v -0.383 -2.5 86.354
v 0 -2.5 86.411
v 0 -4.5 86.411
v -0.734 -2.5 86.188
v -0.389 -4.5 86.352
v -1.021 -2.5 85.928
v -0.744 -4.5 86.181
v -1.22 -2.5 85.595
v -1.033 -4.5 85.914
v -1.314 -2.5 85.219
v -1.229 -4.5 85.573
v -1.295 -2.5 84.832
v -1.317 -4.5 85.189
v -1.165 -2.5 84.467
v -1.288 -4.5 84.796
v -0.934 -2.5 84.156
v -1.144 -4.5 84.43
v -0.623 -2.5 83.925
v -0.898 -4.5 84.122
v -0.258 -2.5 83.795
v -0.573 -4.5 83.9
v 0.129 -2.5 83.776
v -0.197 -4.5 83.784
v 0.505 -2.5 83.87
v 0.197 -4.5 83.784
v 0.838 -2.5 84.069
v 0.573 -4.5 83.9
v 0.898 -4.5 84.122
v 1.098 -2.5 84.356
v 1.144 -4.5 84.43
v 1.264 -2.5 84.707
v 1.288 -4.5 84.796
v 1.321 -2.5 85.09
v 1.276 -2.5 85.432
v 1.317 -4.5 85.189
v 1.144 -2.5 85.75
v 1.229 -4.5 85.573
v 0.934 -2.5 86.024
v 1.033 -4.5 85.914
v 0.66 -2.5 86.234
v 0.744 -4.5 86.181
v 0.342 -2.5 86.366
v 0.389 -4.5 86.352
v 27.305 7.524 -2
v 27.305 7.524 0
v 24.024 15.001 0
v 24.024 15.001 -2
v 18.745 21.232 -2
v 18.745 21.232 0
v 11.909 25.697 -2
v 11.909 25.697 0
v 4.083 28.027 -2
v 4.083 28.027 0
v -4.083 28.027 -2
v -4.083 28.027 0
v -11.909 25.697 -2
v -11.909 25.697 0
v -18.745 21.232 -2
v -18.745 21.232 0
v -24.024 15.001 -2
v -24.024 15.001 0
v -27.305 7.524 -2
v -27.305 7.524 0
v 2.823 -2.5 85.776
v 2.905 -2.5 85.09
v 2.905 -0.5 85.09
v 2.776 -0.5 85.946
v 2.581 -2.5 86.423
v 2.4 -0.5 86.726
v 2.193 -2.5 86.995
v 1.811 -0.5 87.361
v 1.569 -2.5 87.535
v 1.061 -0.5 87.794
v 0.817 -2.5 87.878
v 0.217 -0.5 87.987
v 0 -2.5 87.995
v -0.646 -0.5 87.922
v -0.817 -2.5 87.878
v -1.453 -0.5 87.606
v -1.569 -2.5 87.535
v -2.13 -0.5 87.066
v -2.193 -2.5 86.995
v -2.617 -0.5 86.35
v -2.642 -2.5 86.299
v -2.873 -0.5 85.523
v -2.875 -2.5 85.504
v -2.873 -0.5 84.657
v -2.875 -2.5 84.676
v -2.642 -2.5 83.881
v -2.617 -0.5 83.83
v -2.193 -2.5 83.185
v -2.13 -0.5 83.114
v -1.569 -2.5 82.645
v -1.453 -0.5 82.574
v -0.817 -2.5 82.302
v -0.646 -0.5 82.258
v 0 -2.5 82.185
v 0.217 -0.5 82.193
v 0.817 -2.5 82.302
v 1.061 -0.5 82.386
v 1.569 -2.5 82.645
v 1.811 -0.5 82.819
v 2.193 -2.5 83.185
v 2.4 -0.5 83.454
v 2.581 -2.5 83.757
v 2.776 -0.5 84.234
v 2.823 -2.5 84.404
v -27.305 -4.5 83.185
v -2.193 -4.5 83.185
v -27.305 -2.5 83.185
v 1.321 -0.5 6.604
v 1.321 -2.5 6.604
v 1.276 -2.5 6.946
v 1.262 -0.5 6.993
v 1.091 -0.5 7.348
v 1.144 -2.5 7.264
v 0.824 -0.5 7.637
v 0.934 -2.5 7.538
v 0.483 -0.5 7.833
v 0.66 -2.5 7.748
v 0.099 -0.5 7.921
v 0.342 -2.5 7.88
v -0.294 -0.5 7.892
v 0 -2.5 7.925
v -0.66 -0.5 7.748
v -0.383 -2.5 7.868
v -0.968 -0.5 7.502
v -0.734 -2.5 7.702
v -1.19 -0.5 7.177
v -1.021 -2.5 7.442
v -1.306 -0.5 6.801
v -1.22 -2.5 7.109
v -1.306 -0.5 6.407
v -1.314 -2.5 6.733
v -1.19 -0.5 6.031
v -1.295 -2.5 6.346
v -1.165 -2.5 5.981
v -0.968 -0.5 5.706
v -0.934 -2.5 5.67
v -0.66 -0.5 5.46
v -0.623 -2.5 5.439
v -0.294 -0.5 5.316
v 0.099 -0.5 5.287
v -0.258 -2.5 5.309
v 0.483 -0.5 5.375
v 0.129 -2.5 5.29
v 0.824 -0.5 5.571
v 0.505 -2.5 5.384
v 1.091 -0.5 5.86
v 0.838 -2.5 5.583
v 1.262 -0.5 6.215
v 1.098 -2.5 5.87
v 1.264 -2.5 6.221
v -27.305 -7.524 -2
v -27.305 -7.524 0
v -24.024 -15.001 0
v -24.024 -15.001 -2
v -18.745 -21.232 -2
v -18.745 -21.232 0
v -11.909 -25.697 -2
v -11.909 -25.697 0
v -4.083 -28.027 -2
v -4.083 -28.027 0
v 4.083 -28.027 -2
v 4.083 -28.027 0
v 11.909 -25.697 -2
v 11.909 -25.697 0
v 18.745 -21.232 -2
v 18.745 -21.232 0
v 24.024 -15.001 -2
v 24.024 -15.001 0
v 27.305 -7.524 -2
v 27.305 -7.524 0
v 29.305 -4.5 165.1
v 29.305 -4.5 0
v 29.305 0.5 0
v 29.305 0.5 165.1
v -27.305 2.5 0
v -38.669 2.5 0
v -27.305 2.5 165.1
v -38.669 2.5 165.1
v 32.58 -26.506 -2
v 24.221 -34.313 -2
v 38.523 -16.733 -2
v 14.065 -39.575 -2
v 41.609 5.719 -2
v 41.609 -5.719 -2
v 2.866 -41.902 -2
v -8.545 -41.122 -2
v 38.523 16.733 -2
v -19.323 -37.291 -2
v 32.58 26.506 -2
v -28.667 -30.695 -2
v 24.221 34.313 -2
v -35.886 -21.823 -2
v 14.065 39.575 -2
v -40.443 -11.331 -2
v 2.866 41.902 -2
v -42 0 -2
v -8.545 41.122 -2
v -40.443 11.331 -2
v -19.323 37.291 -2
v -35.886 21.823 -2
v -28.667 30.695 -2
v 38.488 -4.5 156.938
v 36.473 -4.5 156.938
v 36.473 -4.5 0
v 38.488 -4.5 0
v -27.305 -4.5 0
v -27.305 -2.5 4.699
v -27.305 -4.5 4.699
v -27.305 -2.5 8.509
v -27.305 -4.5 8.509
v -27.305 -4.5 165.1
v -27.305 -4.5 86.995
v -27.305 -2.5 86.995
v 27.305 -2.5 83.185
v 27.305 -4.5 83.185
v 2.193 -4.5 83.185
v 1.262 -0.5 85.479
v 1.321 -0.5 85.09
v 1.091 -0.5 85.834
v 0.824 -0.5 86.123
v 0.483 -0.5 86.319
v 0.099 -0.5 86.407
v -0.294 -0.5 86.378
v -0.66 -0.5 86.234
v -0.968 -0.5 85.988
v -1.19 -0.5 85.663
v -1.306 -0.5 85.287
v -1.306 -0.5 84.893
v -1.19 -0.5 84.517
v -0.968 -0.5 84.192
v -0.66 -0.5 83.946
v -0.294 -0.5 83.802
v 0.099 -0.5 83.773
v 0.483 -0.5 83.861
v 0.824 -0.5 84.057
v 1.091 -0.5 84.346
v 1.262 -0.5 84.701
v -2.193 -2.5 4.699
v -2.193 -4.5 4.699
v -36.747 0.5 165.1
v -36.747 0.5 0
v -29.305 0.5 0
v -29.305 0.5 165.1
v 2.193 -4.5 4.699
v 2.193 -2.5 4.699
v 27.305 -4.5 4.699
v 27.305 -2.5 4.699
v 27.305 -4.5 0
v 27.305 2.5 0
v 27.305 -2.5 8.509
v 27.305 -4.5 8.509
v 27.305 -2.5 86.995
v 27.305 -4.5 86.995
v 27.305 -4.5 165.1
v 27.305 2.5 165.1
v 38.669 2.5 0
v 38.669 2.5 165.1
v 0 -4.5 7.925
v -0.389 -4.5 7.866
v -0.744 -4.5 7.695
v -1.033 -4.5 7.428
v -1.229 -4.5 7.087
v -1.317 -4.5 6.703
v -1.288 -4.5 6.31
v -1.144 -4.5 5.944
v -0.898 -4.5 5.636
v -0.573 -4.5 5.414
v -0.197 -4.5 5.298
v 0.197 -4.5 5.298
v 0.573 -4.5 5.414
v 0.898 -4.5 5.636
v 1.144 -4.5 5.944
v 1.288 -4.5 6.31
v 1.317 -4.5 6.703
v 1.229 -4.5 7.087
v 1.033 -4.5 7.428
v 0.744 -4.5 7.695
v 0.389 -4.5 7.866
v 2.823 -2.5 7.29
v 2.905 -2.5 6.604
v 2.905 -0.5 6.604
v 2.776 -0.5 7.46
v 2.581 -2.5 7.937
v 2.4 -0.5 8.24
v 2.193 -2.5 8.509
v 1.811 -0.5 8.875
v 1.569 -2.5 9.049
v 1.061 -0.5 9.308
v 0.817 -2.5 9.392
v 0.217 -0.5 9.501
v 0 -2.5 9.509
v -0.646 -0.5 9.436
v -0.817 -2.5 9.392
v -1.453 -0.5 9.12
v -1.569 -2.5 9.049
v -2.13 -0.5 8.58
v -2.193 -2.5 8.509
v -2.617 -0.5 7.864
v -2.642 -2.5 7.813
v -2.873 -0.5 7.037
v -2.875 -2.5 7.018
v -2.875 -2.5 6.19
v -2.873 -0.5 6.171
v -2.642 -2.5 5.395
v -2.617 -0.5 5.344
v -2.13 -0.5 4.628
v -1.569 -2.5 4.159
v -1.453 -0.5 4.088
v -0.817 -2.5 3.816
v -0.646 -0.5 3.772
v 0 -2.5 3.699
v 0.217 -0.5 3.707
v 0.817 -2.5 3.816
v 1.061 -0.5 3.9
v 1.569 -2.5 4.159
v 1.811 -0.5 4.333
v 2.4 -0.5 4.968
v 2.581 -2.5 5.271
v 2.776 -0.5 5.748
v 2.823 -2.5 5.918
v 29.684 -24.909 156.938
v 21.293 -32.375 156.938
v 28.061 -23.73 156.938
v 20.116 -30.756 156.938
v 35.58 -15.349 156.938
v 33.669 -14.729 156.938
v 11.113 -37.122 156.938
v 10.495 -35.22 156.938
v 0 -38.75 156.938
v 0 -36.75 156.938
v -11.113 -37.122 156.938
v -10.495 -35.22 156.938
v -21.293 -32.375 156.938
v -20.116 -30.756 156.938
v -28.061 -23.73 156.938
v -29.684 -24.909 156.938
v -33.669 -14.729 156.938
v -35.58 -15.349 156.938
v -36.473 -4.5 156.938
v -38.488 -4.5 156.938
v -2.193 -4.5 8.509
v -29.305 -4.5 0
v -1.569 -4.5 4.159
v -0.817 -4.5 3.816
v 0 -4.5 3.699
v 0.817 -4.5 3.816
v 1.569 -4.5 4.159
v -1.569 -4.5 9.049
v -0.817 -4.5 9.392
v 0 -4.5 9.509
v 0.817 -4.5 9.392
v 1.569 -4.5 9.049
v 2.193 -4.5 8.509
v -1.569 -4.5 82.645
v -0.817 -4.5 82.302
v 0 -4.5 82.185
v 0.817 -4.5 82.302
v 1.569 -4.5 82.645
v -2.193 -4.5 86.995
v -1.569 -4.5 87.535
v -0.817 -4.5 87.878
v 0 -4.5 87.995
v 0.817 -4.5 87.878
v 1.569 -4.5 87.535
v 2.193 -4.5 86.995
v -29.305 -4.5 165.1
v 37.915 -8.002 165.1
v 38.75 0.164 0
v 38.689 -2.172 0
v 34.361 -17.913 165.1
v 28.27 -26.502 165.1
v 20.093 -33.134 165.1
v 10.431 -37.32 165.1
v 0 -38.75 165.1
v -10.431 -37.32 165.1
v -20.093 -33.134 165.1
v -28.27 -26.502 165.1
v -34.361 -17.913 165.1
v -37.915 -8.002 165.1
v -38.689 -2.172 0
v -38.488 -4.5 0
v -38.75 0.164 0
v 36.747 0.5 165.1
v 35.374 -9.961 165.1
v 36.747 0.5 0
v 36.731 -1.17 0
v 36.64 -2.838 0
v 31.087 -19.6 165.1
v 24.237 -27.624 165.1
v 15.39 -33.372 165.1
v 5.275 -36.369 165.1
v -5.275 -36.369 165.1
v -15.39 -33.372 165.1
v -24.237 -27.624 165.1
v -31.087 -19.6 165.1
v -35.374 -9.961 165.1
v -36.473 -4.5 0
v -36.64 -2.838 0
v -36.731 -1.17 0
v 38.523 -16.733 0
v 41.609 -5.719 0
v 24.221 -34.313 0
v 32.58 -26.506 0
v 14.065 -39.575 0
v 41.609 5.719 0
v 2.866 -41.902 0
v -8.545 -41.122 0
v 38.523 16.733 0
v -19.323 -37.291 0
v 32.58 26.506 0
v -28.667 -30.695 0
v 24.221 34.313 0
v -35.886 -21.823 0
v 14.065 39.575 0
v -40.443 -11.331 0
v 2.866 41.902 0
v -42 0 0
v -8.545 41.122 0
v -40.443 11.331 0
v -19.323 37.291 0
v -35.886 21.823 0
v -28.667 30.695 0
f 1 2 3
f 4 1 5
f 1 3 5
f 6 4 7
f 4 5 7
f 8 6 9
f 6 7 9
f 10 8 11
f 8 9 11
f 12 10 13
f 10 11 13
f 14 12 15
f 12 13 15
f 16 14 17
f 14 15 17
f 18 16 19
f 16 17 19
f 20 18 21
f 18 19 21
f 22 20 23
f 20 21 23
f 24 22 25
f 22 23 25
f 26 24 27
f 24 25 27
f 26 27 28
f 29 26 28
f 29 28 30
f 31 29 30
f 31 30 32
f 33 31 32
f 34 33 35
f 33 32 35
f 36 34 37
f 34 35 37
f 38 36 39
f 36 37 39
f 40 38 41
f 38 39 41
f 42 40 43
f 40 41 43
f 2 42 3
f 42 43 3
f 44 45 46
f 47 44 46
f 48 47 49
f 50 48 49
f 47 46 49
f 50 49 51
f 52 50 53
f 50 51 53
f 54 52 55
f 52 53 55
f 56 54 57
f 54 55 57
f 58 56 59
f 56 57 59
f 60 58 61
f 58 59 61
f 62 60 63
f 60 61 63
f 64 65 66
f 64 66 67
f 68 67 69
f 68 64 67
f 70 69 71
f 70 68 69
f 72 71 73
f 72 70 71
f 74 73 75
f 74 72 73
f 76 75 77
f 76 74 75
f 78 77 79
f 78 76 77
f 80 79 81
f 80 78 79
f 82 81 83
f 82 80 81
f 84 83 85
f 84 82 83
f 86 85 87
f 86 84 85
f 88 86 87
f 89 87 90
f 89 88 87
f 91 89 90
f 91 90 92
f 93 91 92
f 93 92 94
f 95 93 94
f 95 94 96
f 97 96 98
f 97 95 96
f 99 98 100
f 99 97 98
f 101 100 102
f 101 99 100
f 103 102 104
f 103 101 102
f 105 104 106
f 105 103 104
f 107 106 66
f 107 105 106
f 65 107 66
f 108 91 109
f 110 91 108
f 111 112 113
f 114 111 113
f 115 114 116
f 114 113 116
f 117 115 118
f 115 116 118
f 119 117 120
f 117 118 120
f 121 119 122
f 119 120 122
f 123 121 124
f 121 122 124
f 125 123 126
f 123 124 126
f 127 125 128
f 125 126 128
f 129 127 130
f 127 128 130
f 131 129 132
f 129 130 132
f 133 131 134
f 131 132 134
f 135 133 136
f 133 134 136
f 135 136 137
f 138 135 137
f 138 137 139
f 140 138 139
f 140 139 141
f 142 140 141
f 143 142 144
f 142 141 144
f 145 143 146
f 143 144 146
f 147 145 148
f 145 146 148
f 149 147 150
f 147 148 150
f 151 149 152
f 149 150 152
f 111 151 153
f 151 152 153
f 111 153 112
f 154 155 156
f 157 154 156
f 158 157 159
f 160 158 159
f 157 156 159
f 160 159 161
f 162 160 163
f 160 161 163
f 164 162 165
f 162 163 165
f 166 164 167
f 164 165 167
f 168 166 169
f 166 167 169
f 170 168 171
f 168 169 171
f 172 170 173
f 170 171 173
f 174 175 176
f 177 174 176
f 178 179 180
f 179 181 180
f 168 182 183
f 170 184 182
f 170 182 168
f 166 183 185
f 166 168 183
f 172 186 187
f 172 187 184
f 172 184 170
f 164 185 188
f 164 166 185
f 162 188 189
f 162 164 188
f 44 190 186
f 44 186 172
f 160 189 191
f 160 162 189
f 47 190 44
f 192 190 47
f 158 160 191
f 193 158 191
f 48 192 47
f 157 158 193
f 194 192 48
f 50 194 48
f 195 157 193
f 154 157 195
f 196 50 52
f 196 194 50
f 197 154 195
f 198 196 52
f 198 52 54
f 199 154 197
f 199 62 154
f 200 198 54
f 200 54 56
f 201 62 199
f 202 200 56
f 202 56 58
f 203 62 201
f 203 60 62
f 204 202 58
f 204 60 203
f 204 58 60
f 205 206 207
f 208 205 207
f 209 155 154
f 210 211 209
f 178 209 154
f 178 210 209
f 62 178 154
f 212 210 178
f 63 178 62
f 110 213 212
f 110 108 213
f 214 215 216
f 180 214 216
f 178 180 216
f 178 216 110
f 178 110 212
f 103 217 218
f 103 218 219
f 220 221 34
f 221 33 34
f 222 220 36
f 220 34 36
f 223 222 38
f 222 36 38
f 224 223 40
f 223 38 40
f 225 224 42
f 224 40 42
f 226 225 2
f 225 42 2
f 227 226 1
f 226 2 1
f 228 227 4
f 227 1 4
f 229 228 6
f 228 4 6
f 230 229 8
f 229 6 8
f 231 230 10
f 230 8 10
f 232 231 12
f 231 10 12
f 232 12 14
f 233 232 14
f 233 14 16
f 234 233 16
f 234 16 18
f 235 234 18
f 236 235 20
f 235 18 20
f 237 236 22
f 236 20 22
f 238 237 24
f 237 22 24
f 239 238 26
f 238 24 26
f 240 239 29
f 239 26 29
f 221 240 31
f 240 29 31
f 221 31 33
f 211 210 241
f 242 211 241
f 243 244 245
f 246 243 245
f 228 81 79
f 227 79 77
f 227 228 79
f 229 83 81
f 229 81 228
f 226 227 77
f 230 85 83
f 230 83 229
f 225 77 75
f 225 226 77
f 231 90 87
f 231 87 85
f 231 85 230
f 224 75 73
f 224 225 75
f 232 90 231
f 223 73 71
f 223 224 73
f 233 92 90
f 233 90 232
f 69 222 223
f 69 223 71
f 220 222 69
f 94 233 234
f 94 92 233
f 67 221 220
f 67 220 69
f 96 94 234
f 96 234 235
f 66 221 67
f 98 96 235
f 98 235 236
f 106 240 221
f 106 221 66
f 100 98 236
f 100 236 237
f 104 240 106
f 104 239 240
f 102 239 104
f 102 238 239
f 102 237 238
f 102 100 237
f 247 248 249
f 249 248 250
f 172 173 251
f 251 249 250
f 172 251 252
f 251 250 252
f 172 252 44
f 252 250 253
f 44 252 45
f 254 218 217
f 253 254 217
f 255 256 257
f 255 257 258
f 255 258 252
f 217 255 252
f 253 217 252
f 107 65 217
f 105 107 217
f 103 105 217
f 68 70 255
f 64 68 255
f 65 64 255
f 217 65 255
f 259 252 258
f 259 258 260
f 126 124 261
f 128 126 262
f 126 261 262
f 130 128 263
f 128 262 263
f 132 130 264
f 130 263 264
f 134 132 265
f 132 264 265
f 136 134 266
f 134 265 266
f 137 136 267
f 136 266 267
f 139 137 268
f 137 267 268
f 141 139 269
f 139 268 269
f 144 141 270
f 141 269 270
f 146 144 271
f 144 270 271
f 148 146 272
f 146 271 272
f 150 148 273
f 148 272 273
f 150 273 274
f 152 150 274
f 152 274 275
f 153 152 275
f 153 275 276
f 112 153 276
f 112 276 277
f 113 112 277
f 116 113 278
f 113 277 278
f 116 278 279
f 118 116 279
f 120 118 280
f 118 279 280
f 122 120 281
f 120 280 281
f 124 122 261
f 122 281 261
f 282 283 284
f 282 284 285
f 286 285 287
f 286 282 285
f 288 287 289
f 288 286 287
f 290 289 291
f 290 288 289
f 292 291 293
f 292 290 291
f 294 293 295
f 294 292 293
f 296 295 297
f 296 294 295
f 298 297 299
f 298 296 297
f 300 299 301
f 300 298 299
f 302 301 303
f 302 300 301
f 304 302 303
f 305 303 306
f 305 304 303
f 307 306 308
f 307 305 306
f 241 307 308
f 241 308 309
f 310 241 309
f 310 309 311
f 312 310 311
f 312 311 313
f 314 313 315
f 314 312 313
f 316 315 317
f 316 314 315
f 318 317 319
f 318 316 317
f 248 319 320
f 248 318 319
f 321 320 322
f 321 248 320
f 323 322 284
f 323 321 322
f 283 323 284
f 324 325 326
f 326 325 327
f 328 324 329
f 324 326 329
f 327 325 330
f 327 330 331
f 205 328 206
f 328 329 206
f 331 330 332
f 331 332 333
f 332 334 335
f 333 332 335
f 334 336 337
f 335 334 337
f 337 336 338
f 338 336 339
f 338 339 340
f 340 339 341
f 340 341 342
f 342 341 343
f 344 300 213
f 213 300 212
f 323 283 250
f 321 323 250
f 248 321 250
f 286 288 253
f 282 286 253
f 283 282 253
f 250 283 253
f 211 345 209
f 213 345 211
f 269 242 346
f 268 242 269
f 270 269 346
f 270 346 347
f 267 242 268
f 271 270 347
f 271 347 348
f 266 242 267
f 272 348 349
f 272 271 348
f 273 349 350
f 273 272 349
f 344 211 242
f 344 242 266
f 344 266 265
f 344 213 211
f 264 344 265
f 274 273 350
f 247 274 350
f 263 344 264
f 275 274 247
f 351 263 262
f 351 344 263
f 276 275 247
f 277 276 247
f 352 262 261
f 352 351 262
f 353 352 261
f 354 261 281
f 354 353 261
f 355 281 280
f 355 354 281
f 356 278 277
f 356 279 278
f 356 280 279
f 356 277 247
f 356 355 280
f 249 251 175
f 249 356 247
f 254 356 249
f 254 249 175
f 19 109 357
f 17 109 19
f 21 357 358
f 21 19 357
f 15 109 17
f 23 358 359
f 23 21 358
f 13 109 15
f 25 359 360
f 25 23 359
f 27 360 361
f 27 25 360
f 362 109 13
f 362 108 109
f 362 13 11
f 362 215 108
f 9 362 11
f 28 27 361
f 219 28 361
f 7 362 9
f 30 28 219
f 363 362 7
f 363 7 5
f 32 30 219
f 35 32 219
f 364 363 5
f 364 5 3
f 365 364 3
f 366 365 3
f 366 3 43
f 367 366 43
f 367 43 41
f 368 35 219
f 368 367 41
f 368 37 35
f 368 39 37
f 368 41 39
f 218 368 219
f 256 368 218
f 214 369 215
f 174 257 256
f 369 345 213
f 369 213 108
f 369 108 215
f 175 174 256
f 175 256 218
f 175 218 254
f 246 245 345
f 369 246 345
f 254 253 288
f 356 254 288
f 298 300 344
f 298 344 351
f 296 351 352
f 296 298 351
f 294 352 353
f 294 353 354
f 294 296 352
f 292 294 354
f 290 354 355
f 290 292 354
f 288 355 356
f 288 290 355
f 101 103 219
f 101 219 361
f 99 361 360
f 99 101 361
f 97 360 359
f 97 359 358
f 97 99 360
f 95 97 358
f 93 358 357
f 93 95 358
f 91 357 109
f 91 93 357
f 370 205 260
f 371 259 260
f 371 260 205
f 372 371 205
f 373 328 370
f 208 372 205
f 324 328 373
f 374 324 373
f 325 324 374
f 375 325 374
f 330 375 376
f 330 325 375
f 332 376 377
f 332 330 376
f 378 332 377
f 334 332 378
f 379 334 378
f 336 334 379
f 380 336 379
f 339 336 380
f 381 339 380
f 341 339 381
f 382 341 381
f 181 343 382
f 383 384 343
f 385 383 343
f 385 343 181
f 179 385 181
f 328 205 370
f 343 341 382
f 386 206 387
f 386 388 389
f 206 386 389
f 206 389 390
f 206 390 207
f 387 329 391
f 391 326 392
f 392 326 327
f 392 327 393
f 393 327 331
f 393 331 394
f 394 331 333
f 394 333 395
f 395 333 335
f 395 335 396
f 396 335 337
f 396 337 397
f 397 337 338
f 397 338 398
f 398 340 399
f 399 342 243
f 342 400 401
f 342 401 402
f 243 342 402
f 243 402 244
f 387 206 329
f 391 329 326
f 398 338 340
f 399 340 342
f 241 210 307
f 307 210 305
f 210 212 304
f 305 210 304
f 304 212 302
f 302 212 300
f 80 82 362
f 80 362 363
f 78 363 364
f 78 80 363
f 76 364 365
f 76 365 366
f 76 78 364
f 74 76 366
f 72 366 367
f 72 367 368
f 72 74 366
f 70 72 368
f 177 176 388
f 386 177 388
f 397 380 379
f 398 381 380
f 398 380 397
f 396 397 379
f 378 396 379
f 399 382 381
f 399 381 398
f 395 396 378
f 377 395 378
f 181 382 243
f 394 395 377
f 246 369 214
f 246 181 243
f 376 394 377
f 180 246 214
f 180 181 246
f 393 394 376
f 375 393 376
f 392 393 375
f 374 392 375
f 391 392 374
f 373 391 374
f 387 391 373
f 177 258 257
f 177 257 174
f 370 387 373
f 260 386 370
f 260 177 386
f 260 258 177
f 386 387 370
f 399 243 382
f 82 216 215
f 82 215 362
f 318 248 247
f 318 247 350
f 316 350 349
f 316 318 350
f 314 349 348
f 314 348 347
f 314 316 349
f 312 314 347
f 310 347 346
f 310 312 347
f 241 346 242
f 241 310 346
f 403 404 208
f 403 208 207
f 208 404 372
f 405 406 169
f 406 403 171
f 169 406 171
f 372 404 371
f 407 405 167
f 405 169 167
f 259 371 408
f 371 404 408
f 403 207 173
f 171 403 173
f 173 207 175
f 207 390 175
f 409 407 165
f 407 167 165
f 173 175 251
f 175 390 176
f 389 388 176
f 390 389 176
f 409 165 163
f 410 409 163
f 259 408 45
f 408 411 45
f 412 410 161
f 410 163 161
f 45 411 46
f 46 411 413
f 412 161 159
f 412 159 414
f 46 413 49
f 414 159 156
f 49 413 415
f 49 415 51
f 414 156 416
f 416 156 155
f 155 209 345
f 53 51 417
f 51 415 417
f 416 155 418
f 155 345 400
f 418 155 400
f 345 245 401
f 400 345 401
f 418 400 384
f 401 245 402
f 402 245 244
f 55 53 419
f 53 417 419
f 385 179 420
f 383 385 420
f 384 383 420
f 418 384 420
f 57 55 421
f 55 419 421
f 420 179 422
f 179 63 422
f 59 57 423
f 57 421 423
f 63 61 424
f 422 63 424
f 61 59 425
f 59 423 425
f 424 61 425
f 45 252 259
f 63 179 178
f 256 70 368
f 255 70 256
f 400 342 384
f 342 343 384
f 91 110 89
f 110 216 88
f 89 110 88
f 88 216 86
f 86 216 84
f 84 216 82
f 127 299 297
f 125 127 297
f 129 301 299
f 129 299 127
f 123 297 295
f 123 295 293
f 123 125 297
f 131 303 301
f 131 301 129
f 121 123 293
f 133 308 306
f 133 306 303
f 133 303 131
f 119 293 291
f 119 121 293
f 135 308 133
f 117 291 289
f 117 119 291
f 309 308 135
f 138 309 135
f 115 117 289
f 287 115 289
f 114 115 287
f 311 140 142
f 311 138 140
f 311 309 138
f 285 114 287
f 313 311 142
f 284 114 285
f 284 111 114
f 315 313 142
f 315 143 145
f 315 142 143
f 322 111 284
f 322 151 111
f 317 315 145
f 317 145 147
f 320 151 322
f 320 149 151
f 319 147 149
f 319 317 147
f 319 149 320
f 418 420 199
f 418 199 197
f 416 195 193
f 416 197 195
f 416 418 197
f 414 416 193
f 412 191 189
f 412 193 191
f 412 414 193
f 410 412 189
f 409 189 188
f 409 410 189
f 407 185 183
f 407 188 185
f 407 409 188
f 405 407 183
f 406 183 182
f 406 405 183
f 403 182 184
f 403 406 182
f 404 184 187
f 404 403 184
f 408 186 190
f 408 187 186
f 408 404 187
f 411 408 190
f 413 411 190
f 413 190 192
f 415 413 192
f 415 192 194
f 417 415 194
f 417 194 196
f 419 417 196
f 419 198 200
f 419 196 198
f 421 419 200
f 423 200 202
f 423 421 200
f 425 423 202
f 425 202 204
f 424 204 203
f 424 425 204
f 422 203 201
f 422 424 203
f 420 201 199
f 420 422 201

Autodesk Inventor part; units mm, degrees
ref_plane "YZ Plane" through (0, 0, 0) normal (1, 0, 0) x (0, 1, 0)
ref_plane "XZ Plane" through (0, 0, 0) normal (0, 1, 0) x (-1, 0, 0)
ref_plane "XY Plane" through (0, 0, 0) normal (0, 0, 1) x (1, 0, 0)
sketch "Sketch1" plane through (0, 0, 0) normal (0, 0, 1) x (1, 0, 0)
  circle A0 centre (0, 0) radius 38.75
  dimension "d0" = 77.5
extrude "Extrusion1" add sketch "Sketch1" along normal blind 165.1
sketch "Sketch2" plane through (0, 0, 165.1) normal (0, 0, 1) x (1, 0, 0)
  line L0 (-27.305, -2.5) -> (27.305, -2.5)
  line L1 (27.305, -2.5) -> (27.305, 2.5)
  line L2 (27.305, 2.5) -> (-27.305, 2.5)
  line L3 (-27.305, 2.5) -> (-27.305, -2.5)
  line L4 (-27.305, -2.5) -> (27.305, 2.5) construction
  line L5 (27.305, -2.5) -> (-27.305, 2.5) construction
  line L6 (0, 2.5) -> (41.5863, 2.5)
  line L7 (41.5863, 2.5) -> (41.5863, 42.5)
  line L8 (41.5863, 42.5) -> (0, 42.5)
  line L9 (0, 42.5) -> (0, 2.5)
  line L10 (0, 42.5) -> (-50, 42.5)
  line L11 (-50, 42.5) -> (-50, 2.5)
  line L12 (-50, 2.5) -> (0, 2.5)
  line L13 (0, 2.5) -> (0, 42.5)
  point P0 (0, 0)
  point P1 (-27.305, 2.5)
  dimension "d3" = 54.61
  dimension "d4" = 5
extrude "Extrusion2" cut sketch "Sketch2" against normal through all
sketch "Sketch3" plane through (0, 0, 0) normal (0, 0, -1) x (-1, 0, 0)
  circle A0 centre (0, 0) radius 42
extrude "Extrusion3" add sketch "Sketch3" along normal blind 2
sketch "Sketch4" plane through (-27.305, -2.5, 165.1) normal (0, 1, 0) x (1, 0, 0)
  line L0 (0, 165.1) -> (54.61, 165.1) projected
  line L1 (0, 0) -> (0, 165.1) projected
  point P0 (27.305, 165.1)
  point P1 (27.305, 158.496)
  dimension "d9" = 6.604
  dimension "d10" = 27.305
hole "Hole1" at (0, -2.5, 6.604) direction (0, -1, 0) diameter 2.6416 depth 10.979 thread size "6-32 UNC" class "2B" standard "ANSI Unified Screw Threads"
sketch "Sketch5" plane through (-27.305, -2.5, 165.1) normal (0, 1, 0) x (1, 0, 0)
  line L0 (0, 165.1) -> (54.61, 165.1) projected
  line L1 (0, 0) -> (0, 165.1) projected
  point P0 (27.305, 165.1)
  point P1 (27.305, 80.01)
  dimension "d18" = 85.09
  dimension "d26" = 27.305
hole "Hole2" at (0, -2.5, 85.09) direction (0, -1, 0) diameter 2.6416 depth 10.979 thread size "6-32 UNC" class "2B" standard "ANSI Unified Screw Threads"
shell "Shell1" thickness 2 removed faces 1 at (1.4054, -14.5066, 165.1)
sketch "Sketch6" plane through (27.305, 2.5, 165.1) normal (0, 1, 0) x (1, 0, 0)
  circle A0 centre (-27.305, 158.496) radius 1.3208 projected
  circle A1 centre (-27.305, 80.01) radius 1.3208 projected
  line L0 (0, 79.02) -> (0, 81)
  line L1 (-54.61, 81) -> (-54.61, 79.02)
  line L2 (0, 160.401) -> (0, 156.591)
  line L3 (-54.61, 156.591) -> (-54.61, 160.401)
  line L4 (-54.61, 160.401) -> (0, 156.591) construction
  line L5 (0, 160.401) -> (-54.61, 156.591) construction
  line L6 (0, 78.105) -> (0, 81.915)
  line L7 (-54.61, 81.915) -> (-54.61, 78.105)
  line L8 (-54.61, 78.105) -> (0, 81.915) construction
  line L9 (0, 78.105) -> (-54.61, 81.915) construction
  line L10 (-54.61, 165.1) -> (0, 165.1)
  line L11 (0, 165.1) -> (0, 0)
  line L12 (0, 0) -> (-54.61, 0)
  line L13 (-54.61, 0) -> (-54.61, 165.1)
  arc A2 (-25.1118, 160.401) -> (-29.4982, 160.401) centre (-27.305, 158.496) ccw
  arc A3 (-29.4982, 156.591) -> (-25.1118, 156.591) centre (-27.305, 158.496) ccw
  line L14 (-54.61, 160.401) -> (-29.4982, 160.401)
  line L15 (-25.1118, 160.401) -> (0, 160.401)
  line L16 (0, 156.591) -> (-25.1118, 156.591)
  line L17 (-29.4982, 156.591) -> (-54.61, 156.591)
  line L18 (0, 81.915) -> (-25.1118, 81.915)
  line L19 (-29.4982, 81.915) -> (-54.61, 81.915)
  line L20 (-54.61, 78.105) -> (-29.4982, 78.105)
  line L21 (-25.1118, 78.105) -> (0, 78.105)
  arc A4 (-25.1118, 81.915) -> (-29.4982, 81.915) centre (-27.305, 80.01) ccw
  arc A5 (-29.4982, 78.105) -> (-25.1118, 78.105) centre (-27.305, 80.01) ccw
  point P0 (-27.305, 165.1)
extrude "Extrusion4" cut sketch "Sketch6" against normal blind 12.5 contours L11 L12 L13 L20 A5 L21 | L18 A4 L19 L13 L17 A3 L16 L11 | L15 A2 L14 L13 L10 L11
sketch "Sketch7" plane through (0, 0, 0) normal (1, 0, 0) x (0, 1, 0)
  line L0 (-4.5, 165.1) -> (-4.5, 0) projected
  line L1 (-4.5, 0) -> (-49, 0)
  line L2 (0.5, 0) -> (-4.5, 0) projected
  line L3 (-4.5, 0) -> (-55.1519, 0)
  line L4 (-55.1519, 0) -> (-55.1519, 156.9376)
  line L5 (-55.1519, 156.9376) -> (-4.5, 156.9376)
  line L6 (-4.5, 156.9376) -> (-4.5, 0)
  line L7 (-4.5, 0) -> (-56.1519, 0)
  line L8 (-56.1519, 0) -> (-56.1519, 0)
  line L9 (-56.1519, 0) -> (-4.5, 0)
  line L10 (-4.5, 0) -> (-4.5, 0)
  point P0 (0, 0)
  point P1 (-4.5, 156.9376)
  point P2 (-55.1519, 1)
  point P3 (-4.5, 0)
extrude "Extrusion5" cut sketch "Sketch7" along normal through all both and the other way through all
sketch "Sketch9" plane through (0, 0, 0) normal (0, 0, 1) x (1, 0, 0)
  line L0 (-27.305, -4.5) -> (-27.305, 2.5) projected
  line L1 (-27.305, -1) -> (-27.305, 7.524)
  line L2 (-27.305, -4.5) -> (-27.305, -7.524)
  line L3 (27.305, 2.5) -> (27.305, -4.5) projected
  line L4 (27.305, -1) -> (27.305, 7.524)
  line L5 (27.305, 7.524) -> (27.305, -7.524)
  arc A0 (-27.305, -7.524) -> (27.305, -7.524) centre (0, 0) ccw
  arc A1 (27.305, 7.524) -> (-27.305, 7.524) centre (0, 0) ccw
  point P0 (-27.305, 2.5)
extrude "Extrusion7" cut sketch "Sketch9" against normal blind 2.5
sketch "Sketch14" plane through (2.1932, -2.5, 86.995) normal (0, 1, 0) x (1, 0, 0)
  circle A0 centre (-2.1932, 80.391) radius 1.3208 projected
  circle A1 centre (-2.1932, 80.391) radius 1.3208
  circle A2 centre (-2.1932, 80.391) radius 2.905
  circle A3 centre (-2.1932, 1.905) radius 1.3208 projected
  circle A4 centre (-2.1932, 1.905) radius 1.3208
  circle A5 centre (-2.1932, 1.905) radius 2.905
  point P0 (-2.1932, 86.995)
extrude "Extrusion10" add sketch "Sketch14" along normal blind 2
properties part number "Revised Mount"
